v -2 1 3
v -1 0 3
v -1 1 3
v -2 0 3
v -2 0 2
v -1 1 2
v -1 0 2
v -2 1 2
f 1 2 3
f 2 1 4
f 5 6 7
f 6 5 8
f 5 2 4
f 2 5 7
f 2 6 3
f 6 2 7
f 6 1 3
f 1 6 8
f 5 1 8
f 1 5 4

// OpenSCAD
translate(v = [0, 0, -1]) {
	translate(v = [1, 0, 0]) {
		translate(v = [0, 0, 3]) {
			translate(v = [-3, 0, 0]) {
				cube();
			}
		}
	}
}
